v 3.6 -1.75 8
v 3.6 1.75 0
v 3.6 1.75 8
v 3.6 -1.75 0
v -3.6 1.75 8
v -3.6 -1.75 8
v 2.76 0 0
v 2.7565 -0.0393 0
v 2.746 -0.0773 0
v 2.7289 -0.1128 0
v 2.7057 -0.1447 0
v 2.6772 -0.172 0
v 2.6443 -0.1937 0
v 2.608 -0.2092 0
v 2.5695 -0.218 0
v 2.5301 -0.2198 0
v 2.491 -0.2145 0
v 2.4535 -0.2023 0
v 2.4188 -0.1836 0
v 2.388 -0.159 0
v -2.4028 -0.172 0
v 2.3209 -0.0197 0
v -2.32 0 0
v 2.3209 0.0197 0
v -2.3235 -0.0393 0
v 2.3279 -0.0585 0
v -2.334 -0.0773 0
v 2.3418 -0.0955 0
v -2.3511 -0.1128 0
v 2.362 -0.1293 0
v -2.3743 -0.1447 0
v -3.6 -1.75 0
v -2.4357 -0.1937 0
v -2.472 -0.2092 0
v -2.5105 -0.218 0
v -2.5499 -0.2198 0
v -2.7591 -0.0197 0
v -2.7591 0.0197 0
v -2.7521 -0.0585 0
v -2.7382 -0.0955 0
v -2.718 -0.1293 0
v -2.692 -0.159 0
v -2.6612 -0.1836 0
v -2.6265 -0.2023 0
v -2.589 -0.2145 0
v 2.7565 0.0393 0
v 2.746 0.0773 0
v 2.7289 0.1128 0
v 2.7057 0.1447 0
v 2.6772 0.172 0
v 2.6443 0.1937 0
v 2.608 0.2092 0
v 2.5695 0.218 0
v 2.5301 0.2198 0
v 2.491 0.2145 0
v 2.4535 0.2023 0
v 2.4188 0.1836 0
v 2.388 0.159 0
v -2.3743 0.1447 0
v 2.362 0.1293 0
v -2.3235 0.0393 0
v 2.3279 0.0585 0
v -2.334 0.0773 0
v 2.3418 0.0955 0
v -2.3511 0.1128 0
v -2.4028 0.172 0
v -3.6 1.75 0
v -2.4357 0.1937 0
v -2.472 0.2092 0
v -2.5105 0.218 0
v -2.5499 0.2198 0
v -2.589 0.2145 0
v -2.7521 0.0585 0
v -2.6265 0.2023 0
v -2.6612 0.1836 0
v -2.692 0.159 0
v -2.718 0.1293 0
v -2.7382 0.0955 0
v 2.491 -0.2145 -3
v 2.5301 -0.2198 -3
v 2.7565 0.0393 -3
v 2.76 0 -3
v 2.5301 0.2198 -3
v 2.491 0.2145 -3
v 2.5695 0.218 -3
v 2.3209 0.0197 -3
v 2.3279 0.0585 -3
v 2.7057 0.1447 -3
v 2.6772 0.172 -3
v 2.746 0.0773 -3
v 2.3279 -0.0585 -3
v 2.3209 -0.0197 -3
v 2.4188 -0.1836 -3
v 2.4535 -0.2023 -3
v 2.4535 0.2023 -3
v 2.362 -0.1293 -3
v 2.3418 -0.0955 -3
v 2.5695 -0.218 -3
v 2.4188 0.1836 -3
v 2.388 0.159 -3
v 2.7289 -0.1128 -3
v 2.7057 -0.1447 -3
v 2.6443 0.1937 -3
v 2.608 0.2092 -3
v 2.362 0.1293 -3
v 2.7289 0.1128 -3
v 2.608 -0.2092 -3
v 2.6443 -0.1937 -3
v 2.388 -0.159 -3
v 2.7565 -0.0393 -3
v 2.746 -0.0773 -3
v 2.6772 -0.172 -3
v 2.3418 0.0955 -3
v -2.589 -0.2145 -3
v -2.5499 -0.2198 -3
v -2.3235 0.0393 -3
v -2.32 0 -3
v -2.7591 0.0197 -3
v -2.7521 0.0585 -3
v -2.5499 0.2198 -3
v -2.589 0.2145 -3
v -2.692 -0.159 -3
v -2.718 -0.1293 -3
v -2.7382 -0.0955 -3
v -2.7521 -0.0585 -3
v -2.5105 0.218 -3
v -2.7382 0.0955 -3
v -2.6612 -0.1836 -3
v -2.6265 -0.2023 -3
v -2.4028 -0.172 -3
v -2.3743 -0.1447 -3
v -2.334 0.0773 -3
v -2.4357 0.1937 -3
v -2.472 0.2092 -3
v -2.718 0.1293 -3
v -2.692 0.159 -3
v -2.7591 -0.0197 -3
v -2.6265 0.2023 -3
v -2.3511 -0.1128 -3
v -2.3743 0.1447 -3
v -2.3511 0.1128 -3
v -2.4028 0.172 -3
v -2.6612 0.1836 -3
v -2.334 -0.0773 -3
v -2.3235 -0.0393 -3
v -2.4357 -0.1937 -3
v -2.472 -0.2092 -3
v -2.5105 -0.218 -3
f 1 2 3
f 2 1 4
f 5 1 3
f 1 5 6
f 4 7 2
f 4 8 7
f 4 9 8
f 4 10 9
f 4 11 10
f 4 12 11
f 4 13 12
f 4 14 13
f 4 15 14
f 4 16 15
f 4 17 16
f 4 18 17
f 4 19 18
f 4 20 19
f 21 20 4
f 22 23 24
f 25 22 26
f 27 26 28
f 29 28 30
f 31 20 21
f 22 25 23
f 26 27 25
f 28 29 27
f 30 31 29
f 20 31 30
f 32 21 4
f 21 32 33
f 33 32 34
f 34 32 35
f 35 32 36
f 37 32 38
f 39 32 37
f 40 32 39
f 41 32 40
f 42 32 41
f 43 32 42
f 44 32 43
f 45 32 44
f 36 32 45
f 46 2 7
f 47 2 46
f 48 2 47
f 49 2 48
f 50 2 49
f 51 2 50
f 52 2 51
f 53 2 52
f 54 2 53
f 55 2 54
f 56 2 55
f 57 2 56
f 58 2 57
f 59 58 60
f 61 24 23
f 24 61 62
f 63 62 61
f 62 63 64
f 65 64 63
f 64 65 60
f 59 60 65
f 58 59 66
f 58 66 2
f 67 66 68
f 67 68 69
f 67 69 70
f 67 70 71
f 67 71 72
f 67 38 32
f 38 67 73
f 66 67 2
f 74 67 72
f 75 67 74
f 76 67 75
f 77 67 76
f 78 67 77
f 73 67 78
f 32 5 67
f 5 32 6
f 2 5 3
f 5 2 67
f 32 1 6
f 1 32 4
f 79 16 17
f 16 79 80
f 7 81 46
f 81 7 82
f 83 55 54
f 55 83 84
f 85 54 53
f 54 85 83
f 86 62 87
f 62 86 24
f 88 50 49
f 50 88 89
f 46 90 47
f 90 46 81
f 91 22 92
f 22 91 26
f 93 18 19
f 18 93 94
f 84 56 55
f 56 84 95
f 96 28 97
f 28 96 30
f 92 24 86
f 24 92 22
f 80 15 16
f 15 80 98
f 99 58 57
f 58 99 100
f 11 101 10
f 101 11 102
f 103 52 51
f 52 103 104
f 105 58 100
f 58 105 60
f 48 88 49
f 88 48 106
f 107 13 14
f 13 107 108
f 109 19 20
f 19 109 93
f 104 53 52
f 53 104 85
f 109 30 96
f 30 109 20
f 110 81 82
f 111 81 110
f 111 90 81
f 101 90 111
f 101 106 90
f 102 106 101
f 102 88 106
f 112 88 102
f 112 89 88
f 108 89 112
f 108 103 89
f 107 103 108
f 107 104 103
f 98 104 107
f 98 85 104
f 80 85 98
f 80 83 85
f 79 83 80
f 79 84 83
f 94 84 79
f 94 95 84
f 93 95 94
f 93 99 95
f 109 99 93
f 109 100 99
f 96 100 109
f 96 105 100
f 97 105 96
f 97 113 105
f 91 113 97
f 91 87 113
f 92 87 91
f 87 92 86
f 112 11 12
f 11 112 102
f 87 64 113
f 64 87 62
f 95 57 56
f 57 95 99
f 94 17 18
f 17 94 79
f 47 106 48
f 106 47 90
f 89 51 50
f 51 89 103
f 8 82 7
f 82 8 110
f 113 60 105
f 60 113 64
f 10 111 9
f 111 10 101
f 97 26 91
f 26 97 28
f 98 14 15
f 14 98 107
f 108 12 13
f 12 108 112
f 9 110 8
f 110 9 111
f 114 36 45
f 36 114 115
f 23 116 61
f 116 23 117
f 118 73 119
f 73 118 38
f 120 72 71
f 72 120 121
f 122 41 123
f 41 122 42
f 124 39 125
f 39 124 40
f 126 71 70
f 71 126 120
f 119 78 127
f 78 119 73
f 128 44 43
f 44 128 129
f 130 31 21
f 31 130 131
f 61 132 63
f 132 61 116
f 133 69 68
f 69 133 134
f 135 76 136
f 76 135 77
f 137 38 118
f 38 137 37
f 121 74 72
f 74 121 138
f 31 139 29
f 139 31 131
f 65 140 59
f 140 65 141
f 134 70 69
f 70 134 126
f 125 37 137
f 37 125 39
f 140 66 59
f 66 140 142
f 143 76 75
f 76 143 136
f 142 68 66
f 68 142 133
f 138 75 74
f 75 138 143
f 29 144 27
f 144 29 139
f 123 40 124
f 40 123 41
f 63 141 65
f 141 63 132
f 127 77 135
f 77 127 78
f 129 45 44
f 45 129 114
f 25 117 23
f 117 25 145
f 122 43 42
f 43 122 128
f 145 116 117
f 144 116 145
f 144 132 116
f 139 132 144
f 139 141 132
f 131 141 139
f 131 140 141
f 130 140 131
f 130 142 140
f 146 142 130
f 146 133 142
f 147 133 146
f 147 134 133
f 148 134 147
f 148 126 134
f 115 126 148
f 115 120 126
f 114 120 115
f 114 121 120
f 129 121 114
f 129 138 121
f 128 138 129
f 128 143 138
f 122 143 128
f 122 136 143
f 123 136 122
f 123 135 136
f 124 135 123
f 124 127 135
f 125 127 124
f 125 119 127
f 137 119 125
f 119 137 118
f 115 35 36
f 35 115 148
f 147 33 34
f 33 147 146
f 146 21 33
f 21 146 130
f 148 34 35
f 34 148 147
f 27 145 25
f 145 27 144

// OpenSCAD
$fa = 1;
$fs = 0.04;

body_color = [0.8,0.8,0.1];
body_width = 3.5;
body_height = 8;
body_length = 7.2;

inter_pin_distance = 5.08;

pin_color = [0.9,0.9,0.9];
pin_height = 3;
pin_radius = 0.22;

module pin() {
    color(pin_color)
        rotate([180,0,0])
        linear_extrude(height = pin_height)
            circle(pin_radius);

}

color(body_color)
    translate([-body_length/2,-body_width/2,0])
        cube([body_length,body_width,body_height]);

translate([inter_pin_distance/2,0,0])
    pin();

translate([-inter_pin_distance/2,0,0])
    pin();
